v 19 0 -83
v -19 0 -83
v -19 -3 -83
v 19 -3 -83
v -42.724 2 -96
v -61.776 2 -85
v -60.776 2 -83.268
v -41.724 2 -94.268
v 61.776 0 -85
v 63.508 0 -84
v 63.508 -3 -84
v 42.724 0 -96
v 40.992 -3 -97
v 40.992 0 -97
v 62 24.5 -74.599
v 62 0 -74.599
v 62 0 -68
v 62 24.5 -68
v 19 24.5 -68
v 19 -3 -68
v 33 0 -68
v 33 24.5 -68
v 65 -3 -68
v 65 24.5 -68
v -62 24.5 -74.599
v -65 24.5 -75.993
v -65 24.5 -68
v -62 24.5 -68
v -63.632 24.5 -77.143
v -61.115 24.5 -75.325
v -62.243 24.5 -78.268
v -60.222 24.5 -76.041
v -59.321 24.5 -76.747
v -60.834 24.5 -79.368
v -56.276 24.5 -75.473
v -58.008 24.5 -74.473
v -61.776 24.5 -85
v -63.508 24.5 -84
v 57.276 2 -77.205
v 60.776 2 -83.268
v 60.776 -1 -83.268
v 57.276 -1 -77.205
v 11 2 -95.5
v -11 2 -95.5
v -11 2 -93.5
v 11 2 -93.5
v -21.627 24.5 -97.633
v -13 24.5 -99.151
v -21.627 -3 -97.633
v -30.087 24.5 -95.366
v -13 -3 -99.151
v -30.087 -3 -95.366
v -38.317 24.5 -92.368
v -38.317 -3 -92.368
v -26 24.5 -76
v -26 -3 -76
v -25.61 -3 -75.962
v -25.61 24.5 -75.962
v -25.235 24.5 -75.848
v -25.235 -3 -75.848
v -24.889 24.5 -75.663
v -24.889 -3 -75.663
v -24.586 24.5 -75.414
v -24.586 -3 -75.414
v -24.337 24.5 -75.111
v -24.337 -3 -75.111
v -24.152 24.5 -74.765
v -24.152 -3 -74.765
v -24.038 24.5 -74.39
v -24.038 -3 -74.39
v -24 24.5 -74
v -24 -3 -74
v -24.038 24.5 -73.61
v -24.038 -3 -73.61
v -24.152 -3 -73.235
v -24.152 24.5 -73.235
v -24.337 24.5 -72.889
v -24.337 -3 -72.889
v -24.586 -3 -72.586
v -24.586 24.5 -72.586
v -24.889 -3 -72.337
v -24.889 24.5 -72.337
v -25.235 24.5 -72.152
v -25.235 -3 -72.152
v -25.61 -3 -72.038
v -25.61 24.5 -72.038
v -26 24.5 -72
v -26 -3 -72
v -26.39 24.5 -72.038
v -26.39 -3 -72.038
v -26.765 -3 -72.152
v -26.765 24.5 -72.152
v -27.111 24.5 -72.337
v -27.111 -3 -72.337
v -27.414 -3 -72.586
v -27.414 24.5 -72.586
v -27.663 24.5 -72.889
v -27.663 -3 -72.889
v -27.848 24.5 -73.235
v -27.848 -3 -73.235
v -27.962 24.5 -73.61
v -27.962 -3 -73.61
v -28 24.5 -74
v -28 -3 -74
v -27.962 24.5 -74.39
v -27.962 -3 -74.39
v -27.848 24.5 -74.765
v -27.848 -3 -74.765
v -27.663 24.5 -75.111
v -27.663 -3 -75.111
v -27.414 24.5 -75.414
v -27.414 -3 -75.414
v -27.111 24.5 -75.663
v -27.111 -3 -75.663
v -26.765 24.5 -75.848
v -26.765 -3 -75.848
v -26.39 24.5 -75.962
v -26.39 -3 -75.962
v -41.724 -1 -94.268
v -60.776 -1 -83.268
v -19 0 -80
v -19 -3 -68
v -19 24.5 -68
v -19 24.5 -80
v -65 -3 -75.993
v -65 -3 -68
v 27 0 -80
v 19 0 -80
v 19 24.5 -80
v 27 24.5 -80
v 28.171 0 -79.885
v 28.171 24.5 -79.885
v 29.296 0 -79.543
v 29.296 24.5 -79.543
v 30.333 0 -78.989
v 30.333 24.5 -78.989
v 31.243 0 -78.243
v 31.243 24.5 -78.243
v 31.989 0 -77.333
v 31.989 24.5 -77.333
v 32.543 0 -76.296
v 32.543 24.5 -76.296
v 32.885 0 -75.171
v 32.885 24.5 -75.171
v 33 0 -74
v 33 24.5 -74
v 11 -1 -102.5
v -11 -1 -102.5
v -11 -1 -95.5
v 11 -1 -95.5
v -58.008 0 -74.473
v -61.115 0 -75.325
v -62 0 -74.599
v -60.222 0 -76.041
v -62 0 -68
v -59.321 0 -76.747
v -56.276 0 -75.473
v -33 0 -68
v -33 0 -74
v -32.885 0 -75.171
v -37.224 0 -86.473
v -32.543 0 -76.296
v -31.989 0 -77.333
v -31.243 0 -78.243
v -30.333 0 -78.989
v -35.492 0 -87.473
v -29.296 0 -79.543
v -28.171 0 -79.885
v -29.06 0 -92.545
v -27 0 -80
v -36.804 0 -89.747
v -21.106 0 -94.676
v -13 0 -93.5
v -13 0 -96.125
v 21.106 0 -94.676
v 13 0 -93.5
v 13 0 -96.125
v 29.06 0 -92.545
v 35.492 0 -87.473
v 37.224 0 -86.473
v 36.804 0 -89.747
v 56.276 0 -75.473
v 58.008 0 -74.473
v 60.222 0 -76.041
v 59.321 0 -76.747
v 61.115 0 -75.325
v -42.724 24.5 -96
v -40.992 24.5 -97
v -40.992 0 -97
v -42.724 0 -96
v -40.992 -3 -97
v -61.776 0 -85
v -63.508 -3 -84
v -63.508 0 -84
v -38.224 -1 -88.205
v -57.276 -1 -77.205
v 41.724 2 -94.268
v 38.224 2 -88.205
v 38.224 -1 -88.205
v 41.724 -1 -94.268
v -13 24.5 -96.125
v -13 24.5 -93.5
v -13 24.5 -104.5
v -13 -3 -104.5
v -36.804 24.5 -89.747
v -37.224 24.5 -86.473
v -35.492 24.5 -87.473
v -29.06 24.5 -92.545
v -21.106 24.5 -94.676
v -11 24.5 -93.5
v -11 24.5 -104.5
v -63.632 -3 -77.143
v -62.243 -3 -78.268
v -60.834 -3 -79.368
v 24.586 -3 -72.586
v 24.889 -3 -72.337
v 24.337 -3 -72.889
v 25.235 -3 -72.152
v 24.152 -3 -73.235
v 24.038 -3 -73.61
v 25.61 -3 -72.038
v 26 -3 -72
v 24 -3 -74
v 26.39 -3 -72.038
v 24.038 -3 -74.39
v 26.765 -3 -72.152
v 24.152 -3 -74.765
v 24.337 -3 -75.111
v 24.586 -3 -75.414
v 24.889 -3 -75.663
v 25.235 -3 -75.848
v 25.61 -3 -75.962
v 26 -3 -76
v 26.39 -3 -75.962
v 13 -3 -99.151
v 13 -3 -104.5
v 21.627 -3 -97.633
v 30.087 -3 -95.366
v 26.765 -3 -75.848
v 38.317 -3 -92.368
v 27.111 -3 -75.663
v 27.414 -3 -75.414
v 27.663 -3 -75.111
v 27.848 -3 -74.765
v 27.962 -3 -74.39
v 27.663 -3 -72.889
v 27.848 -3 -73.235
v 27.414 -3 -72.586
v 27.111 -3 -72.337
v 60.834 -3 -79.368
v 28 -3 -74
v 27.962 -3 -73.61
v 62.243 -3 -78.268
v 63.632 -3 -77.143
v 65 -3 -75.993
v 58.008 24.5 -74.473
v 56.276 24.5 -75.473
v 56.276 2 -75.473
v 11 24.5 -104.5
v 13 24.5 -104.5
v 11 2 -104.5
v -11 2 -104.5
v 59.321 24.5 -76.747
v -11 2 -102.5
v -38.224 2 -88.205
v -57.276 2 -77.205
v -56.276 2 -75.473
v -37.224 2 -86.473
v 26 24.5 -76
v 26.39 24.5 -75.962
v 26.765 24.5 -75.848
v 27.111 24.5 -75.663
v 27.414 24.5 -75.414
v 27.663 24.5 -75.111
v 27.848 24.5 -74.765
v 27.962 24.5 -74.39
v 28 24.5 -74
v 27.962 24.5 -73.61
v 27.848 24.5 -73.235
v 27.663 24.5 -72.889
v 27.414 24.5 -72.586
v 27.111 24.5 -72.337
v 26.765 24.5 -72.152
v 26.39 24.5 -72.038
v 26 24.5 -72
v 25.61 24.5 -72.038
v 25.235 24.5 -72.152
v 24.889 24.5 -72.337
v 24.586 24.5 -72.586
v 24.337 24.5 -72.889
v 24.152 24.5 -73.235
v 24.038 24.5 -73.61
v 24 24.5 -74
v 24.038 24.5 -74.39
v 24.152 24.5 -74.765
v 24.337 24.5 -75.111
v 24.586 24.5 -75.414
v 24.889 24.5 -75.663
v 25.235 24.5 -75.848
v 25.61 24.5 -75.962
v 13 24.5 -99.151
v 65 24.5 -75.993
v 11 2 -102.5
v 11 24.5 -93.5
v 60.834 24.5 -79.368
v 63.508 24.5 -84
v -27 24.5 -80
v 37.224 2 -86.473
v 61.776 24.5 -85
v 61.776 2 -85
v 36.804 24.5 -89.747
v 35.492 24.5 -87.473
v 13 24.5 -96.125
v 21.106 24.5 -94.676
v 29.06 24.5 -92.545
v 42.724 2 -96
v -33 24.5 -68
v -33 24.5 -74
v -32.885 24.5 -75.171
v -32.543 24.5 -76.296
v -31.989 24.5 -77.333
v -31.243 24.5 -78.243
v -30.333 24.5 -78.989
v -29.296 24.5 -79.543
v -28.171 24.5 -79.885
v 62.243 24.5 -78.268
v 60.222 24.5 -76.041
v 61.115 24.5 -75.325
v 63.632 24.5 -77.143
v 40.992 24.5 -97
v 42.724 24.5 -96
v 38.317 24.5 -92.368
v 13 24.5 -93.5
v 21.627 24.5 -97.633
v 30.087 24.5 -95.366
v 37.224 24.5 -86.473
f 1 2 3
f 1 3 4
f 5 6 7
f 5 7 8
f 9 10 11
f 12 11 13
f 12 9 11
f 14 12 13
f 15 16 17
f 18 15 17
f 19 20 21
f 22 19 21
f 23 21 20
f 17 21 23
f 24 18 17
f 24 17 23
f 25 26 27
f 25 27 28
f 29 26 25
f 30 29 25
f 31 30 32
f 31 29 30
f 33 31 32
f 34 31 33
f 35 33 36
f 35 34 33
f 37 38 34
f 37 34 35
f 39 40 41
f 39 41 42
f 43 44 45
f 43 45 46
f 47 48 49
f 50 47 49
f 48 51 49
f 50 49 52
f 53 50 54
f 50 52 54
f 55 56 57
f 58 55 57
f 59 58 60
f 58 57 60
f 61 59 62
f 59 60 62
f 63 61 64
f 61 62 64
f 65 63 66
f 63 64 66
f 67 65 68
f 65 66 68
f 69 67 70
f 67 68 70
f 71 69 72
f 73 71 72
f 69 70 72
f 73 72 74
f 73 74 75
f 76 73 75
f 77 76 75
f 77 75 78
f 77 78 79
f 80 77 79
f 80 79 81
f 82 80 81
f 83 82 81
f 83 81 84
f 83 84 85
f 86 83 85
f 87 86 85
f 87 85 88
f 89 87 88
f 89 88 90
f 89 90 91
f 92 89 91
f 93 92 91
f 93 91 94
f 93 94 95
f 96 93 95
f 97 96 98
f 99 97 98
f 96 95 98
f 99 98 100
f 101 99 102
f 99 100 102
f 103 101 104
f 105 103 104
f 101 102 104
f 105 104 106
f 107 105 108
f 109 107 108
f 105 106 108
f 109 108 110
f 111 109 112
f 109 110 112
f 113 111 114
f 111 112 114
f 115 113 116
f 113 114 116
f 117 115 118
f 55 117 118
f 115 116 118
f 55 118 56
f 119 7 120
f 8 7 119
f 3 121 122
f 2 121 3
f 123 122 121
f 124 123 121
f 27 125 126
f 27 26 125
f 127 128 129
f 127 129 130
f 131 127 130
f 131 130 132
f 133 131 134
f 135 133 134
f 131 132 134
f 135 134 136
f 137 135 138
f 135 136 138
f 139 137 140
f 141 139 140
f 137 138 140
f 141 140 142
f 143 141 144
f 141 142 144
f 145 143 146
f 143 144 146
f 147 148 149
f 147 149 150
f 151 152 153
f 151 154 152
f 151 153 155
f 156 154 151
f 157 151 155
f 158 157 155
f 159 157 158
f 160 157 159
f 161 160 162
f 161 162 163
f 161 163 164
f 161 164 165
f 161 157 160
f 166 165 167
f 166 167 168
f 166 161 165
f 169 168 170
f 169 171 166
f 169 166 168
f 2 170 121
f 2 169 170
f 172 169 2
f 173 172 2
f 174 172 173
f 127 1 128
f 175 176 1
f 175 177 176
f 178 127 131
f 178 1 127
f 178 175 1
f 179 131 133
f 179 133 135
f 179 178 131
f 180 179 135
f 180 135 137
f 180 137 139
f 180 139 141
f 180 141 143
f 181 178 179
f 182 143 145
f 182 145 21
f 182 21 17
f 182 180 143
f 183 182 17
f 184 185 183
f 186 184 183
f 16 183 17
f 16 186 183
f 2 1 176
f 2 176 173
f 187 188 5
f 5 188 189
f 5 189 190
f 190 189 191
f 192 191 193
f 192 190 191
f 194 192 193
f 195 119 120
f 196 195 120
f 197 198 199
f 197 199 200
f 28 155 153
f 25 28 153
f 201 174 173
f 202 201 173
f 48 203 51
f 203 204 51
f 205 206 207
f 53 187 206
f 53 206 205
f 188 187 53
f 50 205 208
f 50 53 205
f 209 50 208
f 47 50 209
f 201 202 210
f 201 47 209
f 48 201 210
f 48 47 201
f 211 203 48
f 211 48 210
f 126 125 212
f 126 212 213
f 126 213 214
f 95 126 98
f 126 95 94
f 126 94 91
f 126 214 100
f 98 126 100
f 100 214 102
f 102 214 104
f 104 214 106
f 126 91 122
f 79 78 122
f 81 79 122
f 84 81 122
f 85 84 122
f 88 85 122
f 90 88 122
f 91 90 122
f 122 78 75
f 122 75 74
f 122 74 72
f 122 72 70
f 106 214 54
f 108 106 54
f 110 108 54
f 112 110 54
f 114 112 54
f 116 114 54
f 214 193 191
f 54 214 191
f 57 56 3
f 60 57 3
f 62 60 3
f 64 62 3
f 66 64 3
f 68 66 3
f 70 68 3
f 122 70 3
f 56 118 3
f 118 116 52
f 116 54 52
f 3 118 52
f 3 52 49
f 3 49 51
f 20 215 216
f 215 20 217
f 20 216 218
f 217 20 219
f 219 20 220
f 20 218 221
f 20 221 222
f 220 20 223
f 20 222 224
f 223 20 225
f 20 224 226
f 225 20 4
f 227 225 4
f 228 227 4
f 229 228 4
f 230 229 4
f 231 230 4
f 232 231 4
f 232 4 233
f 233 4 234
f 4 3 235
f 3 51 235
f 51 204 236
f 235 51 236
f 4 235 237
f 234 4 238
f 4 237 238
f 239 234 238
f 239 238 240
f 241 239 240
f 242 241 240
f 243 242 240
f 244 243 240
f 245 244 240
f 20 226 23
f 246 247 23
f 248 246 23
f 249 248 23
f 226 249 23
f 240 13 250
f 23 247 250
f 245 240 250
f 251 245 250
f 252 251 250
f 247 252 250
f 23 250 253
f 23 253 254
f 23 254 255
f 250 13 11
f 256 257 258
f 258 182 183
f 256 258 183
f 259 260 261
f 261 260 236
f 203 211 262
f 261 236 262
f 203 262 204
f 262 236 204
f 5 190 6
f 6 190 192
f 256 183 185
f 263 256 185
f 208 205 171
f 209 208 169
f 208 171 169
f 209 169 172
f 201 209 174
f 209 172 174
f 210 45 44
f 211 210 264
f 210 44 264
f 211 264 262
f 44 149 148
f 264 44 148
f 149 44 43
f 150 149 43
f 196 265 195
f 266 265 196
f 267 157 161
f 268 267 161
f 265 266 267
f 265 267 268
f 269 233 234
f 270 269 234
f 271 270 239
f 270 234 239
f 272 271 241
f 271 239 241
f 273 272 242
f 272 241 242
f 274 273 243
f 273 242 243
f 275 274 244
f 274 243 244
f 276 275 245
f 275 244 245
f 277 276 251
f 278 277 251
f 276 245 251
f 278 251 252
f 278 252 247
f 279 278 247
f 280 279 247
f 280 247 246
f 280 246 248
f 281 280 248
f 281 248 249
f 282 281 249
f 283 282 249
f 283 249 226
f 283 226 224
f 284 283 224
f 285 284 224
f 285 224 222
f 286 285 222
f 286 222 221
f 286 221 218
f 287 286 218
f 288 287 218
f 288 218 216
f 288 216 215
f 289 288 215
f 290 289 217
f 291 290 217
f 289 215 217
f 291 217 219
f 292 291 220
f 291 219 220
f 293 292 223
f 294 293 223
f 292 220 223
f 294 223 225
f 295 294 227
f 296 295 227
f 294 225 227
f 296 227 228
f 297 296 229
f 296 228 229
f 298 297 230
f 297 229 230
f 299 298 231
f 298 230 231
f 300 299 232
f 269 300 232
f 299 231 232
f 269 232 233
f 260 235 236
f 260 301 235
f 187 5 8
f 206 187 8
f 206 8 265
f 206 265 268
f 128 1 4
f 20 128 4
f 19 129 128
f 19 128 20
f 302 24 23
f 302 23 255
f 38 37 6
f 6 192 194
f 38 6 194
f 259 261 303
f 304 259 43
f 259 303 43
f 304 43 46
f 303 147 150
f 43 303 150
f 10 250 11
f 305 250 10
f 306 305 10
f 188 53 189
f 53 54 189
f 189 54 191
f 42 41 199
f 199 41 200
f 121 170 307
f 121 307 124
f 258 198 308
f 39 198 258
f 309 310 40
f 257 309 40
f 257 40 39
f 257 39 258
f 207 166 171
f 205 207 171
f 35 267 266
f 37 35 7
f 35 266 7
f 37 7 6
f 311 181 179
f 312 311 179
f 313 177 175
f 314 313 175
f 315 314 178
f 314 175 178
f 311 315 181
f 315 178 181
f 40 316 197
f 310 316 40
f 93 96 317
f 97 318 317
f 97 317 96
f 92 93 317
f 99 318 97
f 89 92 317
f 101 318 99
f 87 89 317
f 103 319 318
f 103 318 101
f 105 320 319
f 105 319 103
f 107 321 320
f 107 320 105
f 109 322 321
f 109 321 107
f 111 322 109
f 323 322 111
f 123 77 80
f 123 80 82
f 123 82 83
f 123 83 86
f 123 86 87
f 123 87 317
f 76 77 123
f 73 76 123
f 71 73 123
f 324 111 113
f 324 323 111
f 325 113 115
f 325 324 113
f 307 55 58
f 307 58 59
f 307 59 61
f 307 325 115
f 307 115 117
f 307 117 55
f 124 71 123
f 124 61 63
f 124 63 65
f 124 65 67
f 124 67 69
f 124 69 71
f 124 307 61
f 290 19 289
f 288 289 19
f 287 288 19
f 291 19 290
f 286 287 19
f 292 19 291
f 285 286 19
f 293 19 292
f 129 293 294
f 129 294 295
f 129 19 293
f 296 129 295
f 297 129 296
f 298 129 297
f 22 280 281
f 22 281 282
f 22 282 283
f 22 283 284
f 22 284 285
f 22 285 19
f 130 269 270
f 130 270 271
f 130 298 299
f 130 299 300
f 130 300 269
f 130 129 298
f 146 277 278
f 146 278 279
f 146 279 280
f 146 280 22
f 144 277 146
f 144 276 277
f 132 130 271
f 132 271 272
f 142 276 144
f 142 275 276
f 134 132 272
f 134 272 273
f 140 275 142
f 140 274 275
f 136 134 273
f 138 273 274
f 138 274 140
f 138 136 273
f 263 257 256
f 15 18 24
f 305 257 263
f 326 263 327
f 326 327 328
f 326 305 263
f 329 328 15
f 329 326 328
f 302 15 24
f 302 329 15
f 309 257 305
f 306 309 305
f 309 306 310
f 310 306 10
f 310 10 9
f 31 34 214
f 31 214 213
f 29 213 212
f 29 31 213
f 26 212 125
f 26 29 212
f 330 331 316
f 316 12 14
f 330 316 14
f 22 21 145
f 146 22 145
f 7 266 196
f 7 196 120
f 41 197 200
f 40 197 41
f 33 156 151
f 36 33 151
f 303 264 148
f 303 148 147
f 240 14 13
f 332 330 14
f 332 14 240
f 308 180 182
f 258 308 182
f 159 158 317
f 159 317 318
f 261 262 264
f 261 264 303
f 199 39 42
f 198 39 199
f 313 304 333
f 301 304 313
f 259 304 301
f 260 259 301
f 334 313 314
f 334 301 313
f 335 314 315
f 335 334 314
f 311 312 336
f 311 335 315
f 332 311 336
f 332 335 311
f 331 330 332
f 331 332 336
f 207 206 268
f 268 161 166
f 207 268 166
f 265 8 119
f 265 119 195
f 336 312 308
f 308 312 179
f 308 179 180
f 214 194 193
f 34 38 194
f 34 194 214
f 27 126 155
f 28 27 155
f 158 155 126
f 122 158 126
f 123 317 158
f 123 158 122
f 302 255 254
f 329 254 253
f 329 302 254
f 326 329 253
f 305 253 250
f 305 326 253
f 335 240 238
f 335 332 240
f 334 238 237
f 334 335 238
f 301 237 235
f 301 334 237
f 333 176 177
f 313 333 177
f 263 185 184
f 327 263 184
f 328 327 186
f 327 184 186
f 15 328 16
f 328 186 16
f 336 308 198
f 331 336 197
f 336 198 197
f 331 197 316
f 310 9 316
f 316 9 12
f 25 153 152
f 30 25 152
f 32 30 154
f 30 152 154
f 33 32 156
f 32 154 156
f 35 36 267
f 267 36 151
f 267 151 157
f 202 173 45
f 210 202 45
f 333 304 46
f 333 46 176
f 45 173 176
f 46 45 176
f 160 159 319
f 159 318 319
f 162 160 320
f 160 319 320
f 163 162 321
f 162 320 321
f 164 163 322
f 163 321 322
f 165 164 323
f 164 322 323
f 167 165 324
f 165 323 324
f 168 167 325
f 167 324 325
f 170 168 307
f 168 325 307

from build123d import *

# Parameters (mm, degrees)
EXTRUDE_1842_DEPTH     = 3
SKETCH_5_W             = 14
SKETCH_5_H             = 12
EXTRUDE_4250_DEPTH     = 24.5
SKETCH_9_W             = 22
SKETCH_9_H             = 11
EXTRUDE_5165_DEPTH     = 2
SKETCH_11_W            = 22
SKETCH_11_H            = 7
CUT_EXTRUDE_6076_DEPTH = 3
SKETCH_6_R             = 2
CUT_EXTRUDE_6516_DEPTH = 127.101149876
FILLET_2_R             = 6


with BuildPart() as part:
    # 草图1 → Extrude 1842 (new body)
    with BuildSketch(Plane(origin=(0, 0, 0), x_dir=(1, 0, 0), z_dir=(0, 1, 0))):
        with BuildLine():
            Line((-65, 75.993420768), (-65, 68))
            Line((-65, 68), (-19, 68))
            Line((-19, 68), (-19, 83))
            Line((-19, 83), (19, 83))
            Line((19, 83), (19, 68))
            Line((19, 68), (65, 68))
            Line((65, 68), (65, 75.993420768))
            ThreePointArc((65, 75.993420768), (62.939630568, 77.708448086), (60.834029942, 79.367630688))
            Line((60.834029942, 79.367630688), (63.508330249, 83.999654695))
            Line((63.508330249, 83.999654695), (40.991669751, 96.999654695))
            Line((40.991669751, 96.999654695), (38.317369443, 92.367630688))
            ThreePointArc((38.317369443, 92.367630688), (25.88190451, 96.592582629), (13, 99.151399385))
            Line((13, 99.151399385), (13, 104.5))
            Line((13, 104.5), (-13, 104.5))
            Line((-13, 104.5), (-13, 99.151399385))
            ThreePointArc((-13, 99.151399385), (-25.88190451, 96.592582629), (-38.317369443, 92.367630688))
            Line((-38.317369443, 92.367630688), (-40.991669751, 96.999654695))
            Line((-40.991669751, 96.999654695), (-63.508330249, 83.999654695))
            Line((-63.508330249, 83.999654695), (-60.834029942, 79.367630688))
            ThreePointArc((-60.834029942, 79.367630688), (-62.939630568, 77.708448086), (-65, 75.993420768))
        make_face()
    extrude(amount=-EXTRUDE_1842_DEPTH)

    # 草图5 → Extrude 4250 (add)
    with BuildSketch(Plane(origin=(0, 0, 0), x_dir=(1, 0, 0), z_dir=(0, 1, 0))):
        with BuildLine():
            Line((-11, 104.5), (-13, 104.5))
            Line((-13, 104.5), (-13, 99.151399385))
            ThreePointArc((-13, 99.151399385), (-25.88190451, 96.592582629), (-38.317369443, 92.367630688))
            Line((-38.317369443, 92.367630688), (-40.991669751, 96.999654695))
            Line((-40.991669751, 96.999654695), (-42.723720558, 95.999654695))
            Line((-42.723720558, 95.999654695), (-37.223720558, 86.473375254))
            Line((-37.223720558, 86.473375254), (-35.491669751, 87.473375254))
            Line((-35.491669751, 87.473375254), (-36.804129114, 89.746621553))
            ThreePointArc((-36.804129114, 89.746621553), (-25.105447375, 93.69480515), (-13, 96.124918726))
            Line((-13, 96.124918726), (-13, 93.5))
            Line((-13, 93.5), (-11, 93.5))
            Line((-11, 93.5), (-11, 104.5))
        make_face()
        with BuildLine():
            Line((13, 104.5), (11, 104.5))
            Line((11, 104.5), (11, 93.5))
            Line((11, 93.5), (13, 93.5))
            Line((13, 93.5), (13, 96.124918726))
            ThreePointArc((13, 96.124918726), (25.105447375, 93.69480515), (36.804129114, 89.746621553))
            Line((36.804129114, 89.746621553), (35.491669751, 87.473375254))
            Line((35.491669751, 87.473375254), (37.223720558, 86.473375254))
            Line((37.223720558, 86.473375254), (42.723720558, 95.999654695))
            Line((42.723720558, 95.999654695), (40.991669751, 96.999654695))
            Line((40.991669751, 96.999654695), (38.317369443, 92.367630688))
            ThreePointArc((38.317369443, 92.367630688), (25.88190451, 96.592582629), (13, 99.151399385))
            Line((13, 99.151399385), (13, 104.5))
        make_face()
        with BuildLine():
            Line((-61.776279442, 84.999654695), (-63.508330249, 83.999654695))
            Line((-63.508330249, 83.999654695), (-60.834029942, 79.367630688))
            ThreePointArc((-60.834029942, 79.367630688), (-62.939630568, 77.708448086), (-65, 75.993420768))
            Line((-65, 75.993420768), (-65, 68))
            Line((-65, 68), (-62, 68))
            Line((-62, 68), (-62, 74.598927606))
            ThreePointArc((-62, 74.598927606), (-60.669899006, 75.684630901), (-59.320789612, 76.746621553))
            Line((-59.320789612, 76.746621553), (-58.008330249, 74.473375254))
            Line((-58.008330249, 74.473375254), (-56.276279442, 75.473375254))
            Line((-56.276279442, 75.473375254), (-61.776279442, 84.999654695))
        make_face()
        with BuildLine():
            Line((58.008330249, 74.473375254), (59.320789612, 76.746621553))
            ThreePointArc((59.320789612, 76.746621553), (60.669899006, 75.684630901), (62, 74.598927606))
            Line((62, 74.598927606), (62, 68))
            Line((62, 68), (65, 68))
            Line((65, 68), (65, 75.993420768))
            ThreePointArc((65, 75.993420768), (62.939630568, 77.708448086), (60.834029942, 79.367630688))
            Line((60.834029942, 79.367630688), (63.508330249, 83.999654695))
            Line((63.508330249, 83.999654695), (61.776279442, 84.999654695))
            Line((61.776279442, 84.999654695), (56.276279442, 75.473375254))
            Line((56.276279442, 75.473375254), (58.008330249, 74.473375254))
        make_face()
        with Locations((-26, 74)):
            Rectangle(SKETCH_5_W, SKETCH_5_H)
        with Locations((26, 74)):
            Rectangle(SKETCH_5_W, SKETCH_5_H)
    extrude(amount=EXTRUDE_4250_DEPTH)

    # 草图9 → Extrude 5165 (add)
    with BuildSketch(Plane(origin=(0, 0, 0), x_dir=(1, 0, 0), z_dir=(0, 1, 0))):
        Polygon((-56.276279442, 75.473375254), (-37.223720558, 86.473375254), (-42.723720558, 95.999654695), (-61.776279442, 84.999654695), align=None)
        with Locations((0, 99)):
            Rectangle(SKETCH_9_W, SKETCH_9_H)
        Polygon((37.223720558, 86.473375254), (56.276279442, 75.473375254), (61.776279442, 84.999654695), (42.723720558, 95.999654695), align=None)
    extrude(amount=EXTRUDE_5165_DEPTH)

    # 草图11 → Cut-Extrude 6076 (cut)
    with BuildSketch(Plane(origin=(0, 2, 0), x_dir=(1, 0, 0), z_dir=(0, 1, 0))):
        Polygon((-60.776279442, 83.267603888), (-41.723720558, 94.267603888), (-38.223720558, 88.205426061), (-57.276279442, 77.205426061), align=None)
        with Locations((0, 99)):
            Rectangle(SKETCH_11_W, SKETCH_11_H)
        Polygon((41.723720558, 94.267603888), (60.776279442, 83.267603888), (57.276279442, 77.205426061), (38.223720558, 88.205426061), align=None)
    extrude(amount=-CUT_EXTRUDE_6076_DEPTH, mode=Mode.SUBTRACT)

    # 草图6 → Cut-Extrude 6516 (cut, through all)
    with BuildSketch(Plane.XZ.offset(3)):
        with Locations(Location((-26, -74, 0), (0, 0, 270))):
            Circle(SKETCH_6_R)
        with Locations(Location((26, -74, 0), (0, 0, 270))):
            Circle(SKETCH_6_R)
    extrude(amount=-CUT_EXTRUDE_6516_DEPTH, mode=Mode.SUBTRACT)

    # 圆角2
    fillet_2_edges = [part.edges().sort_by_distance(p)[0] for p in [
        (-33, 12.25, -80),
        (33, 12.25, -80),
    ]]
    fillet(fillet_2_edges, radius=FILLET_2_R)


solid = part.part
